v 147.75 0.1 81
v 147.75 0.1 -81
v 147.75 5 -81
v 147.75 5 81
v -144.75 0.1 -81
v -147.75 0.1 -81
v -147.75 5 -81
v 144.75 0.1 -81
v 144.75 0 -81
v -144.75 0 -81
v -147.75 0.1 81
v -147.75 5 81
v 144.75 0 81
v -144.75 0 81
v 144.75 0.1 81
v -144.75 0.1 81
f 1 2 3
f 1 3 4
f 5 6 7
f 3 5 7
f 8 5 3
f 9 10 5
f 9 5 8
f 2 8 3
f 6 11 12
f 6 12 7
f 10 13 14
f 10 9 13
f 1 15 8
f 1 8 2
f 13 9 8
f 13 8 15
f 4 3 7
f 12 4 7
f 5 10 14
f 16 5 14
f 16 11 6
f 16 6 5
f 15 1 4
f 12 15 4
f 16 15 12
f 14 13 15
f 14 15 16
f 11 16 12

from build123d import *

# Parameters (mm, degrees)
BOSS_EXTRUDE1_DEPTH     = 5
CUT_EXTRUDE1_DEPTH      = 194.597682063
CUT_EXTRUDE1_DEPTH_BACK = 194.597682063
SKETCH2_W               = 116.5
SKETCH2_H               = 44
SKETCH3_W               = 6
SKETCH3_H               = 162
CUT_EXTRUDE2_DEPTH      = 0.1


with BuildPart() as part:
    # Sketch1 → Boss-Extrude1 (new body)
    with BuildSketch(Plane(origin=(0, 0, 0), x_dir=(1, 0, 0), z_dir=(0, 1, 0))):
        Polygon((-58.25, 125), (58.25, 125), (58.25, 81), (147.75, 81), (147.75, -81), (58.25, -81), (58.25, -125), (-58.25, -125), (-58.25, -81), (-147.75, -81), (-147.75, 81), (-58.25, 81), align=None)
    extrude(amount=BOSS_EXTRUDE1_DEPTH)

    # Sketch2 → Cut-Extrude1 (cut, two sides: drawn at the far end of the back side and taken through both)
    with BuildSketch(Plane.XZ.offset(-CUT_EXTRUDE1_DEPTH_BACK)):
        with Locations((0, 103)):
            Rectangle(SKETCH2_W, SKETCH2_H)
        with Locations((0, -103)):
            Rectangle(SKETCH2_W, SKETCH2_H)
    extrude(amount=CUT_EXTRUDE1_DEPTH + CUT_EXTRUDE1_DEPTH_BACK, mode=Mode.SUBTRACT)

    # Sketch3 → Cut-Extrude2 (cut)
    with BuildSketch(Plane.XZ):
        with Locations((-147.75, 0)):
            Rectangle(SKETCH3_W, SKETCH3_H)
        with Locations((147.75, 0)):
            Rectangle(SKETCH3_W, SKETCH3_H)
    extrude(amount=-CUT_EXTRUDE2_DEPTH, mode=Mode.SUBTRACT)


solid = part.part
